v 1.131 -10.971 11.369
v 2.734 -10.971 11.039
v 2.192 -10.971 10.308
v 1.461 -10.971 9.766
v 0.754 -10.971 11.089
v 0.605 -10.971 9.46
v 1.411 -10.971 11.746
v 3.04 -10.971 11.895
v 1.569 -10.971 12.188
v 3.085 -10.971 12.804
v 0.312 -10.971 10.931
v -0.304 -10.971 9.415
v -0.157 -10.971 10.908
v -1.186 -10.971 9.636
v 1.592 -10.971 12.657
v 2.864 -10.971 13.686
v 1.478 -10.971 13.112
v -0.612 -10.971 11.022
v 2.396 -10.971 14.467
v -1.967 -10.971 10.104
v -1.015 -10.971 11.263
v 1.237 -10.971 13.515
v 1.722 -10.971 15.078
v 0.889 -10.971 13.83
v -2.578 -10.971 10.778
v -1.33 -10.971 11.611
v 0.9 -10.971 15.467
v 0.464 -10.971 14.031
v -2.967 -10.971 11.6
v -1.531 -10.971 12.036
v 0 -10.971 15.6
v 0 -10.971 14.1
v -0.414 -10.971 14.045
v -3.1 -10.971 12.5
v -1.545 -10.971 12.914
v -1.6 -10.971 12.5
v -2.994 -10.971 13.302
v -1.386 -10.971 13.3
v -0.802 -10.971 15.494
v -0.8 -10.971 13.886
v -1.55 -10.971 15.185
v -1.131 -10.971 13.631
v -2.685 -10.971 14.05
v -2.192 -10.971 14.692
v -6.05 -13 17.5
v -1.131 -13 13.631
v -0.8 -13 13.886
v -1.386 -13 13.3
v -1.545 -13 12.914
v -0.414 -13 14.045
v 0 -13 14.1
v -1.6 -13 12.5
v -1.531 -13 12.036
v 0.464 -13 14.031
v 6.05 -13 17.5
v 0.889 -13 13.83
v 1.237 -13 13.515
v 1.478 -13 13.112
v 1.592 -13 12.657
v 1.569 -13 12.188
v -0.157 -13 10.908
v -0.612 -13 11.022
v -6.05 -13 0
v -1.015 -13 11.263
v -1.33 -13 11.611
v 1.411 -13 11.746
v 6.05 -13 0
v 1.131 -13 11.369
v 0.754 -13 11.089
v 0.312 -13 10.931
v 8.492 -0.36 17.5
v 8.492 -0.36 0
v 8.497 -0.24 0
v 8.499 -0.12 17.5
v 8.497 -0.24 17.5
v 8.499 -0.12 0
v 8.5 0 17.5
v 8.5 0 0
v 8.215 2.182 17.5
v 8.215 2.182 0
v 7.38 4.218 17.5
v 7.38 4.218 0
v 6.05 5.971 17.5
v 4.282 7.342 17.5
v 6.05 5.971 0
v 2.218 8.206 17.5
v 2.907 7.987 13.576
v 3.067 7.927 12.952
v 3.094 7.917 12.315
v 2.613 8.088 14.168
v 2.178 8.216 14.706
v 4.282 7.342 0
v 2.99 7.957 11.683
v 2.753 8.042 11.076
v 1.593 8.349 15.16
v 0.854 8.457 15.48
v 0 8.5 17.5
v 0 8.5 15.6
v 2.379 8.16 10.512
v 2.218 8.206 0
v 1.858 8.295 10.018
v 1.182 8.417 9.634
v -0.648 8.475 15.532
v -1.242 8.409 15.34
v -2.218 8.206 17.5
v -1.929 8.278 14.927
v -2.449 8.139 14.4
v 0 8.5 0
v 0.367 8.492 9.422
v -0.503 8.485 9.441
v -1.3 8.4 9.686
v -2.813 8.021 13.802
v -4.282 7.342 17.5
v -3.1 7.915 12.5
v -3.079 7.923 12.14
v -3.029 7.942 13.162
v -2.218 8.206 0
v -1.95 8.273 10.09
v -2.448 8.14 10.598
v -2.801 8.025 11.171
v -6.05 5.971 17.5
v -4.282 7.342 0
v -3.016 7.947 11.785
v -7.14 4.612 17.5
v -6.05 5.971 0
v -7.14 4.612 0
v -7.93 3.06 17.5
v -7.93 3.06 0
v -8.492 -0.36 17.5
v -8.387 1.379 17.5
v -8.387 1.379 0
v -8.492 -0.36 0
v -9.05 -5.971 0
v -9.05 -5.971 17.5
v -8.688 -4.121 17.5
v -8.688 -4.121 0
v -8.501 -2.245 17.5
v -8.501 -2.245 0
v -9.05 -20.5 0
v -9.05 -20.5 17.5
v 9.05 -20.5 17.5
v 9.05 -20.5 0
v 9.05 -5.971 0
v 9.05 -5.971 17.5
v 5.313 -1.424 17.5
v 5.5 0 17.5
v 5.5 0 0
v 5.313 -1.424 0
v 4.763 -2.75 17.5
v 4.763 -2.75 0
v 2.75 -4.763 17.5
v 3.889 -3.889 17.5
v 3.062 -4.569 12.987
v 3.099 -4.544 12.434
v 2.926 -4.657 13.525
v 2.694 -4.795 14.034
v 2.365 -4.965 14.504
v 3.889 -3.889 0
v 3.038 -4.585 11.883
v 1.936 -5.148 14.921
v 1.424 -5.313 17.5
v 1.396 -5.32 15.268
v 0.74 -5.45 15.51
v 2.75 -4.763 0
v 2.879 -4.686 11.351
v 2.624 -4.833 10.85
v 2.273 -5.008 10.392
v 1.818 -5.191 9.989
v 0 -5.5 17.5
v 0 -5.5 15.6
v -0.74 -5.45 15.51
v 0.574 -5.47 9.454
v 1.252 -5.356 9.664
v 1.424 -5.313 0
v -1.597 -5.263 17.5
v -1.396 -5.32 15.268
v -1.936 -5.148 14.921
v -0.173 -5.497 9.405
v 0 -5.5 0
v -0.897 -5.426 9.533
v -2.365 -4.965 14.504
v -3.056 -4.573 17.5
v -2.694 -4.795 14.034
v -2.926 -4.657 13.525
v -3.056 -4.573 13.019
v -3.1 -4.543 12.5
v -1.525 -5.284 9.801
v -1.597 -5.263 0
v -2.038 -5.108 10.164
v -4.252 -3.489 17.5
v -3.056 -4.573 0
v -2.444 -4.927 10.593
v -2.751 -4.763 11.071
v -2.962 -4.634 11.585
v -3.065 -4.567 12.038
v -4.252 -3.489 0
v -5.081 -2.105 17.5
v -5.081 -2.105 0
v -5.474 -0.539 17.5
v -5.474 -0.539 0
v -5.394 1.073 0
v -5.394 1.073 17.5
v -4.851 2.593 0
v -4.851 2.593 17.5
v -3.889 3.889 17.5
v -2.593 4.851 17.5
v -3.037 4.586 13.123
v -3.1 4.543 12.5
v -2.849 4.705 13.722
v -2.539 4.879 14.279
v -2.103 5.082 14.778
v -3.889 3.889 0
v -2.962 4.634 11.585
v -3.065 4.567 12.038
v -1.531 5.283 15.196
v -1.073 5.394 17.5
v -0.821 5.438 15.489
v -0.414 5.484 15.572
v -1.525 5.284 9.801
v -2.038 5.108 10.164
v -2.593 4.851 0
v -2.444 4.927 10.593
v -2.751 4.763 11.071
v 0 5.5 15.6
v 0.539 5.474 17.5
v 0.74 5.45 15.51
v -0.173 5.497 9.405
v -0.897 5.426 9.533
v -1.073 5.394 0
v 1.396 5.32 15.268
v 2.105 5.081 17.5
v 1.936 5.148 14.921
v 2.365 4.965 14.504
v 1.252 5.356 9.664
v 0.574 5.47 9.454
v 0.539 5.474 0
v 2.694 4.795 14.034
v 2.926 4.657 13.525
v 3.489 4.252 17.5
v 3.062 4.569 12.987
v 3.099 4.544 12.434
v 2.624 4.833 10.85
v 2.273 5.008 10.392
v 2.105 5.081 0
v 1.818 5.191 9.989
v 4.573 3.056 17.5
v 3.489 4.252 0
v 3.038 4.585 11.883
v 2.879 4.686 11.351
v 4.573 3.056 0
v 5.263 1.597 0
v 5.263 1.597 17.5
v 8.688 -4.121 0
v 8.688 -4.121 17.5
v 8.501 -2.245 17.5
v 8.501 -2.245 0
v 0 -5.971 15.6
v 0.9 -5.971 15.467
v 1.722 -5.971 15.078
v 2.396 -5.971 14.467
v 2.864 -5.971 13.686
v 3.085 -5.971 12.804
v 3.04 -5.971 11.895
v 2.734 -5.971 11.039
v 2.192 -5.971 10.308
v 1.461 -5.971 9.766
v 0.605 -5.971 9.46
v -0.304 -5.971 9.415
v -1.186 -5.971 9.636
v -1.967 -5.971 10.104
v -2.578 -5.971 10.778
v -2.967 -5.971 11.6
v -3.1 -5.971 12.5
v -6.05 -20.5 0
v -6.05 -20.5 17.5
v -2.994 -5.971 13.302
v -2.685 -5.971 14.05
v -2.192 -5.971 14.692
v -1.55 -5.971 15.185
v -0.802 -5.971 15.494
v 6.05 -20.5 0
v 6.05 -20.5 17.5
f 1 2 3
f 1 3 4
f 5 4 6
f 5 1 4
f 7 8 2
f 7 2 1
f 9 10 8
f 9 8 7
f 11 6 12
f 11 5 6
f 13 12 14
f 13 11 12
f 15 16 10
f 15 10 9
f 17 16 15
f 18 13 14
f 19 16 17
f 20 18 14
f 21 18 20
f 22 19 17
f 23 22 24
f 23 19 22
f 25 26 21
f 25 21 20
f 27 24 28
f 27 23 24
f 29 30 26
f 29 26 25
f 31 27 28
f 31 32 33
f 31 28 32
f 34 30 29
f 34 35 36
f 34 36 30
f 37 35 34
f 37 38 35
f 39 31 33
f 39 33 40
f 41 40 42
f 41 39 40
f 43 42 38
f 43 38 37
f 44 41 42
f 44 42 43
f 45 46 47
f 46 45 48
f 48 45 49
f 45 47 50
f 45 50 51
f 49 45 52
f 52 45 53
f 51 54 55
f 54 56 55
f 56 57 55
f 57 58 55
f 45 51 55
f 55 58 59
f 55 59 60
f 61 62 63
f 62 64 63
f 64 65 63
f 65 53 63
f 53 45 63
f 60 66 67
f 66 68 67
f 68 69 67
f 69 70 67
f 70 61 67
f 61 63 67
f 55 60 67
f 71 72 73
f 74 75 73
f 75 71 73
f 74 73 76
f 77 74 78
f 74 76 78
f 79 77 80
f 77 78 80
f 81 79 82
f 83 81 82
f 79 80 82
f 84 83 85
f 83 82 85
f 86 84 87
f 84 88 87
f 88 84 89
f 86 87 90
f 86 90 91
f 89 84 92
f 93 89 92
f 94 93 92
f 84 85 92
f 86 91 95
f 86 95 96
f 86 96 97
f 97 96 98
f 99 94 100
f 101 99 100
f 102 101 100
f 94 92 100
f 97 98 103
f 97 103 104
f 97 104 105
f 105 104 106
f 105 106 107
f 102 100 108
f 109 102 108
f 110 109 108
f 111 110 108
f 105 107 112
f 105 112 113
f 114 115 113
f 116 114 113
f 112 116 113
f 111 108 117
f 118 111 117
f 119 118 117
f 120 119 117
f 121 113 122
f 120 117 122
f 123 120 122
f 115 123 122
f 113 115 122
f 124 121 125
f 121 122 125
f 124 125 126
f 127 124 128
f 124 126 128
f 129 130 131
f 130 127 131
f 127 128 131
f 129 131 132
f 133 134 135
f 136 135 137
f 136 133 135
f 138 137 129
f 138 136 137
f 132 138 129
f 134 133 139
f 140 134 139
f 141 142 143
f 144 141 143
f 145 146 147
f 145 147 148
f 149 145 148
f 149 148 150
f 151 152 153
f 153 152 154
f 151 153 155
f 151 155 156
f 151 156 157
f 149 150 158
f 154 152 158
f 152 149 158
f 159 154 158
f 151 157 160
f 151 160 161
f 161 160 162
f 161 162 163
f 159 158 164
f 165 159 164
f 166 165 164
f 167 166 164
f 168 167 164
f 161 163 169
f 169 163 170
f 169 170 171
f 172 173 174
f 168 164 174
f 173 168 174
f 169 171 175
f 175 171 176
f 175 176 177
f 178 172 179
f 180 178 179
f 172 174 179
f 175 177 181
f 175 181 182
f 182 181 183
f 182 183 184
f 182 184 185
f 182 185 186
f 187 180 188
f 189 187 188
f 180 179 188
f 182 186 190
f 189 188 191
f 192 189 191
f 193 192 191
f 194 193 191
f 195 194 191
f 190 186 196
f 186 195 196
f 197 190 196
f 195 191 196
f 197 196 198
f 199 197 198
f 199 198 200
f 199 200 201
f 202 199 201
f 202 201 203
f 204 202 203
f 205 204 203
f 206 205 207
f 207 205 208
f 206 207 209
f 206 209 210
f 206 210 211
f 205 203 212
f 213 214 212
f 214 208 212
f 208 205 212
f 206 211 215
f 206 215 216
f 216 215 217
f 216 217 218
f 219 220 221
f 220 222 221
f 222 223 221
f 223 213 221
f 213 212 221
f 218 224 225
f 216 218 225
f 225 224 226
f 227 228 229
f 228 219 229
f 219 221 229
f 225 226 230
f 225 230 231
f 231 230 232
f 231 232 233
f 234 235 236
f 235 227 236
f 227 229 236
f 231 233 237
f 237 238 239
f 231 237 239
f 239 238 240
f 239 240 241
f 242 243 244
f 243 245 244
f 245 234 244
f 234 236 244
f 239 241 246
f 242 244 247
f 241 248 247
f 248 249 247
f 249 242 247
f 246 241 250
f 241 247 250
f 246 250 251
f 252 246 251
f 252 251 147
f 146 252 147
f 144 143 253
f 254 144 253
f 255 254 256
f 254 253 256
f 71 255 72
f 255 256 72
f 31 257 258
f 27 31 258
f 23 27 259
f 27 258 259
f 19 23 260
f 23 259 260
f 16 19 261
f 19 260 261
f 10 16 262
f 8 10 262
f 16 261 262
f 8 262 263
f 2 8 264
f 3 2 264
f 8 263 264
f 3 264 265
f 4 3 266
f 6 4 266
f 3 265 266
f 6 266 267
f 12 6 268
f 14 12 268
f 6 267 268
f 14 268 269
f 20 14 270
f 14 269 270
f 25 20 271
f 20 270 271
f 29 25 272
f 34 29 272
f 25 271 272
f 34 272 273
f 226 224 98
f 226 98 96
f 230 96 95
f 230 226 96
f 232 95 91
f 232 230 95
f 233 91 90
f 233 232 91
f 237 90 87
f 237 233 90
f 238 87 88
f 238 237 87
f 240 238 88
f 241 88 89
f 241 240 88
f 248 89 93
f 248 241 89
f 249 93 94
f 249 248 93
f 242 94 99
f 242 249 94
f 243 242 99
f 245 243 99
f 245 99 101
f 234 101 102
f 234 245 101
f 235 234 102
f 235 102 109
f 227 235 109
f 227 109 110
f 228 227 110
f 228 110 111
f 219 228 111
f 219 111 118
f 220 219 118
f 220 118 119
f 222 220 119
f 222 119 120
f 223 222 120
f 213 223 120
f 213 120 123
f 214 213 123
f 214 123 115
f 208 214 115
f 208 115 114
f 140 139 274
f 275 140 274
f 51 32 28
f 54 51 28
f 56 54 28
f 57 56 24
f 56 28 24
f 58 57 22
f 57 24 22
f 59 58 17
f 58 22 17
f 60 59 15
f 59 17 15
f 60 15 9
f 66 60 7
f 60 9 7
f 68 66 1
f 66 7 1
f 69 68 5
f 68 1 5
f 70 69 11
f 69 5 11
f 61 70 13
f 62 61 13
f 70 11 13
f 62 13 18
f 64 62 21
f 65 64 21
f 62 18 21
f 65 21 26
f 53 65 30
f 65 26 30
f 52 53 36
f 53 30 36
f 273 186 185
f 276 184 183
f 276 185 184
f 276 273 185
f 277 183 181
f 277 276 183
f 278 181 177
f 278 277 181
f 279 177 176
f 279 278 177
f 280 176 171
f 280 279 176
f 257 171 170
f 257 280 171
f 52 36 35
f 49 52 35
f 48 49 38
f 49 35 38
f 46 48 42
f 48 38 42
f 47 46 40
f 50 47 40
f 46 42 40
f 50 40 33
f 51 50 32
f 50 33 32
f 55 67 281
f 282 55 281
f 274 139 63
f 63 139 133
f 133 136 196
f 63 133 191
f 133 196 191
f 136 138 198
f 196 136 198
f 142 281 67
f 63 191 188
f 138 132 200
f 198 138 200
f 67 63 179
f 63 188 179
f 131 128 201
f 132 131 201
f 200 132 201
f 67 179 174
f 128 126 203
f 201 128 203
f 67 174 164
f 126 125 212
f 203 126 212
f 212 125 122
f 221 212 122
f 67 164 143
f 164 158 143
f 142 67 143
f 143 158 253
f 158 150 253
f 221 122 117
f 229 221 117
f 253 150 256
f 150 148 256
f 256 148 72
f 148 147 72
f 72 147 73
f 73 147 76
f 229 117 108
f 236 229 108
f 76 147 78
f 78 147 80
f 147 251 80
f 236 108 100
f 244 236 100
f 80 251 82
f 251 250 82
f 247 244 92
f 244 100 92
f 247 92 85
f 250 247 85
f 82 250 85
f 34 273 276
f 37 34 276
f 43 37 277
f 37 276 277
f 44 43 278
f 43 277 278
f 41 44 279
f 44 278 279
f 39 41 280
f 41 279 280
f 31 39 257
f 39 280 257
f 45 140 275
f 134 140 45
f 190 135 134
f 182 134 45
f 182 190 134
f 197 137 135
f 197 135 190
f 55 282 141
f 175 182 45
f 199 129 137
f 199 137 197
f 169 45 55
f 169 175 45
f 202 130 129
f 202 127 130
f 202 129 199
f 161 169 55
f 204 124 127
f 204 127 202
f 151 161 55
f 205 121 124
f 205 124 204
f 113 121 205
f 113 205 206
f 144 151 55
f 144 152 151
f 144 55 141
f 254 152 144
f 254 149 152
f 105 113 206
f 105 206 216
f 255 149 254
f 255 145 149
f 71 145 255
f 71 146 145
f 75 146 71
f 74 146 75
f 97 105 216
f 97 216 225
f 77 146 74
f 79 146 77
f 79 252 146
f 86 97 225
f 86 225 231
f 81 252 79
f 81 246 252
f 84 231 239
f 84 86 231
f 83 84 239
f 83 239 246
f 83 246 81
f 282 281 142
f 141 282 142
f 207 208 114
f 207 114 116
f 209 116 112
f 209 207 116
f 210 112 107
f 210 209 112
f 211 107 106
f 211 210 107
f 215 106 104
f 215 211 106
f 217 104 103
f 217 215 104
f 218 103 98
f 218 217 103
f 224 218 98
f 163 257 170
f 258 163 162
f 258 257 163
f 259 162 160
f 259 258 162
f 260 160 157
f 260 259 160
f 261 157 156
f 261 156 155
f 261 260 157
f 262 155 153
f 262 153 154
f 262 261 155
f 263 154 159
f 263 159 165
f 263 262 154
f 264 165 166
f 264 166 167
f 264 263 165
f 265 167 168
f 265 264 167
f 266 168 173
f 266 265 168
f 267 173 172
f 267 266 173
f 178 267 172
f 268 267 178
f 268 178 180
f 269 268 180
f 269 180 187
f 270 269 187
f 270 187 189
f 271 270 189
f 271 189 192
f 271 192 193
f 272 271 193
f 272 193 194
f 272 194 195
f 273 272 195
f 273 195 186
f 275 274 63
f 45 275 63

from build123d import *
from build123d import SkipClean  # not in build123d's __all__

# Parameters (mm, degrees)
F1_DEPTH    = 17.5
F2_DEPTH    = 9
F3_T4_DEPTH = 24.2978178738
F3_T9_DEPTH = 24.2978178738
F5_DEPTH    = 8.5
F6_DEPTH    = 25
F7_DEPTH    = 5
F8_DEPTH    = 25


# Not quite as in the source:
# - a fillet or chamfer that OpenCascade refuses, or shapes differently, is made with other operations: its cross-section is extruded or revolved along the edge and cut away or added
# - after a boolean that leaves OpenCascade's solid faulty, fix() repairs it
# - a feature names something its author has since deleted; it is built from what else it names


with BuildPart() as f1:
    # F0 (on Top) → F1 (new body)
    with BuildSketch(Plane.XY):
        Polygon((-6.05, -13), (-6.05, -5.9705527382), (-9.05, -5.9705527382), (-9.05, -20.5), (-6.05, -20.5), align=None)
        with BuildLine():
            Line((0, -13), (0, -8.5))
            ThreePointArc((0, -8.5), (-3.2787422684, -7.842183952), (-6.05, -5.9705527382))
            Line((-6.05, -5.9705527382), (-6.05, -13))
            Line((-6.05, -13), (0, -13))
        make_face()
        with BuildLine():
            ThreePointArc((6.05, -5.9705527382), (3.2787422684, -7.842183952), (0, -8.5))
            Line((0, -8.5), (0, -13))
            Line((0, -13), (6.05, -13))
            Line((6.05, -13), (6.05, -5.9705527382))
        make_face()
        Polygon((9.05, -5.9705527382), (6.05, -5.9705527382), (6.05, -13), (6.05, -20.5), (9.05, -20.5), align=None)
    extrude(amount=F1_DEPTH)

    # F0 (on Top) → F2 (join)
    with BuildSketch(Plane.XY):
        with BuildLine():
            Line((-6.05, -5.9705527382), (0, -5.9705527382))
            Line((0, -5.9705527382), (6.05, -5.9705527382))
            Line((6.05, -5.9705527382), (6.05, 5.9705527382))
            ThreePointArc((6.05, 5.9705527382), (0, 8.5), (-6.05, 5.9705527382))
            Line((-6.05, 5.9705527382), (-6.05, -5.9705527382))
        make_face()
        with BuildLine():
            ThreePointArc((0, -5.5), (-3.8890872965, 3.8890872965), (5.5, 0))
            ThreePointArc((5.5, 0), (3.8890872965, -3.8890872965), (0, -5.5))
        make_face(mode=Mode.SUBTRACT)
        with BuildLine():
            Line((6.05, 5.9705527382), (6.05, -5.9705527382))
            ThreePointArc((6.05, -5.9705527382), (7.8636823435, -3.2268405601), (8.5, 0))
            ThreePointArc((8.5, 0), (7.8636823435, 3.2268405601), (6.05, 5.9705527382))
        make_face()
        with BuildLine():
            ThreePointArc((-6.05, 5.9705527382), (-8.5, 0), (-6.05, -5.9705527382))
            Line((-6.05, -5.9705527382), (-6.05, 5.9705527382))
        make_face()
        with BuildLine():
            Line((0, -8.5), (0, -5.9705527382))
            Line((0, -5.9705527382), (-6.05, -5.9705527382))
            ThreePointArc((-6.05, -5.9705527382), (-3.2787422684, -7.842183952), (0, -8.5))
        make_face()
        with BuildLine():
            Line((6.05, -5.9705527382), (0, -5.9705527382))
            Line((0, -5.9705527382), (0, -8.5))
            ThreePointArc((0, -8.5), (3.2787422684, -7.842183952), (6.05, -5.9705527382))
        make_face()
    extrude(amount=F2_DEPTH)

    # F3: fillet of radius 20 on 4 edges, made by hand


with BuildPart() as f3_tool2:
    # F3_s3 → F3_t4 (new body)
    with BuildSketch(Plane.XY):
        with BuildLine():
            ThreePointArc((-9.05, -5.9705527382), (-8.5724849096, -3.1850150396), (-8.492373898, -0.3599799676))
            ThreePointArc((-8.492373898, -0.3599799676), (-7.7935737214, -3.3926698409), (-6.05, -5.9705527382))
            Line((-6.05, -5.9705527382), (-9.05, -5.9705527382))
        make_face()
    extrude(amount=F3_T4_DEPTH)

    split(bisect_by=Plane.XY.offset(17.5), keep=Keep.BOTTOM)


with BuildPart() as f1_1:
    add(f1.part, clean=False)

    # F3_t1: union F3_tool2
    add(f3_tool2.part)


with BuildPart() as f3_tool7:
    # F3_s8 → F3_t9 (new body)
    with BuildSketch(Plane.XY):
        with BuildLine():
            ThreePointArc((9.05, -5.9705527382), (8.5724849096, -3.1850150396), (8.492373898, -0.3599799676))
            ThreePointArc((8.492373898, -0.3599799676), (7.7935737214, -3.3926698409), (6.05, -5.9705527382))
            Line((6.05, -5.9705527382), (9.05, -5.9705527382))
        make_face()
    extrude(amount=F3_T9_DEPTH)

    split(bisect_by=Plane.XY.offset(17.5), keep=Keep.BOTTOM)


with BuildPart() as f1_2:
    add(f1_1.part, clean=False)

    # F3_t6: union F3_tool7
    add(f3_tool7.part)

    # F5 (add, through all): a face of the model
    f5_faces = [f1_2.faces().sort_by_distance(p)[0] for p in [
        (0, -8.2595836944, 9),
    ]]
    extrude(f5_faces, amount=F5_DEPTH)

    # F4 (on face) → F6 (cut)
    with BuildSketch(Plane(origin=(0, -5.9705527382, 0), x_dir=(-1, 0, 0), z_dir=(0, 1, 0))):
        with BuildLine():
            ThreePointArc((3.1, 12.5), (2.1920310217, 14.6920310217), (0, 15.6))
            ThreePointArc((0, 15.6), (-2.1920310217, 10.3079689783), (3.1, 12.5))
        make_face()
        with BuildLine():
            ThreePointArc((1.6, 12.5), (-1.1313708499, 11.3686291501), (0, 14.1))
            ThreePointArc((0, 14.1), (1.1313708499, 13.6313708499), (1.6, 12.5))
        make_face(mode=Mode.SUBTRACT)
        with BuildLine():
            ThreePointArc((1.6, 12.5), (1.1313708499, 13.6313708499), (0, 14.1))
            ThreePointArc((0, 14.1), (-1.1313708499, 11.3686291501), (1.6, 12.5))
        make_face()
    extrude(amount=F6_DEPTH, mode=Mode.SUBTRACT)

    # F4 (on face) → F7 (cut)
    with BuildSketch(Plane(origin=(0, -5.9705527382, 0), x_dir=(-1, 0, 0), z_dir=(0, 1, 0))):
        with BuildLine():
            ThreePointArc((3.1, 12.5), (2.1920310217, 14.6920310217), (0, 15.6))
            ThreePointArc((0, 15.6), (-2.1920310217, 10.3079689783), (3.1, 12.5))
        make_face()
        with BuildLine():
            ThreePointArc((1.6, 12.5), (-1.1313708499, 11.3686291501), (0, 14.1))
            ThreePointArc((0, 14.1), (1.1313708499, 13.6313708499), (1.6, 12.5))
        make_face(mode=Mode.SUBTRACT)
    with SkipClean():  # cleaning this boolean's faces spoils the solid; the shape is the same uncleaned
        extrude(amount=-F7_DEPTH, mode=Mode.SUBTRACT)

    # F4 (on face) → F8 (cut)
    with BuildSketch(Plane(origin=(0, -5.9705527382, 0), x_dir=(-1, 0, 0), z_dir=(0, 1, 0))):
        with BuildLine():
            ThreePointArc((1.6, 12.5), (1.1313708499, 13.6313708499), (0, 14.1))
            ThreePointArc((0, 14.1), (-1.1313708499, 11.3686291501), (1.6, 12.5))
        make_face()
    extrude(amount=-F8_DEPTH, mode=Mode.SUBTRACT)

    add(f1_2.part.fix(), mode=Mode.REPLACE)


solid = f1_2.part
